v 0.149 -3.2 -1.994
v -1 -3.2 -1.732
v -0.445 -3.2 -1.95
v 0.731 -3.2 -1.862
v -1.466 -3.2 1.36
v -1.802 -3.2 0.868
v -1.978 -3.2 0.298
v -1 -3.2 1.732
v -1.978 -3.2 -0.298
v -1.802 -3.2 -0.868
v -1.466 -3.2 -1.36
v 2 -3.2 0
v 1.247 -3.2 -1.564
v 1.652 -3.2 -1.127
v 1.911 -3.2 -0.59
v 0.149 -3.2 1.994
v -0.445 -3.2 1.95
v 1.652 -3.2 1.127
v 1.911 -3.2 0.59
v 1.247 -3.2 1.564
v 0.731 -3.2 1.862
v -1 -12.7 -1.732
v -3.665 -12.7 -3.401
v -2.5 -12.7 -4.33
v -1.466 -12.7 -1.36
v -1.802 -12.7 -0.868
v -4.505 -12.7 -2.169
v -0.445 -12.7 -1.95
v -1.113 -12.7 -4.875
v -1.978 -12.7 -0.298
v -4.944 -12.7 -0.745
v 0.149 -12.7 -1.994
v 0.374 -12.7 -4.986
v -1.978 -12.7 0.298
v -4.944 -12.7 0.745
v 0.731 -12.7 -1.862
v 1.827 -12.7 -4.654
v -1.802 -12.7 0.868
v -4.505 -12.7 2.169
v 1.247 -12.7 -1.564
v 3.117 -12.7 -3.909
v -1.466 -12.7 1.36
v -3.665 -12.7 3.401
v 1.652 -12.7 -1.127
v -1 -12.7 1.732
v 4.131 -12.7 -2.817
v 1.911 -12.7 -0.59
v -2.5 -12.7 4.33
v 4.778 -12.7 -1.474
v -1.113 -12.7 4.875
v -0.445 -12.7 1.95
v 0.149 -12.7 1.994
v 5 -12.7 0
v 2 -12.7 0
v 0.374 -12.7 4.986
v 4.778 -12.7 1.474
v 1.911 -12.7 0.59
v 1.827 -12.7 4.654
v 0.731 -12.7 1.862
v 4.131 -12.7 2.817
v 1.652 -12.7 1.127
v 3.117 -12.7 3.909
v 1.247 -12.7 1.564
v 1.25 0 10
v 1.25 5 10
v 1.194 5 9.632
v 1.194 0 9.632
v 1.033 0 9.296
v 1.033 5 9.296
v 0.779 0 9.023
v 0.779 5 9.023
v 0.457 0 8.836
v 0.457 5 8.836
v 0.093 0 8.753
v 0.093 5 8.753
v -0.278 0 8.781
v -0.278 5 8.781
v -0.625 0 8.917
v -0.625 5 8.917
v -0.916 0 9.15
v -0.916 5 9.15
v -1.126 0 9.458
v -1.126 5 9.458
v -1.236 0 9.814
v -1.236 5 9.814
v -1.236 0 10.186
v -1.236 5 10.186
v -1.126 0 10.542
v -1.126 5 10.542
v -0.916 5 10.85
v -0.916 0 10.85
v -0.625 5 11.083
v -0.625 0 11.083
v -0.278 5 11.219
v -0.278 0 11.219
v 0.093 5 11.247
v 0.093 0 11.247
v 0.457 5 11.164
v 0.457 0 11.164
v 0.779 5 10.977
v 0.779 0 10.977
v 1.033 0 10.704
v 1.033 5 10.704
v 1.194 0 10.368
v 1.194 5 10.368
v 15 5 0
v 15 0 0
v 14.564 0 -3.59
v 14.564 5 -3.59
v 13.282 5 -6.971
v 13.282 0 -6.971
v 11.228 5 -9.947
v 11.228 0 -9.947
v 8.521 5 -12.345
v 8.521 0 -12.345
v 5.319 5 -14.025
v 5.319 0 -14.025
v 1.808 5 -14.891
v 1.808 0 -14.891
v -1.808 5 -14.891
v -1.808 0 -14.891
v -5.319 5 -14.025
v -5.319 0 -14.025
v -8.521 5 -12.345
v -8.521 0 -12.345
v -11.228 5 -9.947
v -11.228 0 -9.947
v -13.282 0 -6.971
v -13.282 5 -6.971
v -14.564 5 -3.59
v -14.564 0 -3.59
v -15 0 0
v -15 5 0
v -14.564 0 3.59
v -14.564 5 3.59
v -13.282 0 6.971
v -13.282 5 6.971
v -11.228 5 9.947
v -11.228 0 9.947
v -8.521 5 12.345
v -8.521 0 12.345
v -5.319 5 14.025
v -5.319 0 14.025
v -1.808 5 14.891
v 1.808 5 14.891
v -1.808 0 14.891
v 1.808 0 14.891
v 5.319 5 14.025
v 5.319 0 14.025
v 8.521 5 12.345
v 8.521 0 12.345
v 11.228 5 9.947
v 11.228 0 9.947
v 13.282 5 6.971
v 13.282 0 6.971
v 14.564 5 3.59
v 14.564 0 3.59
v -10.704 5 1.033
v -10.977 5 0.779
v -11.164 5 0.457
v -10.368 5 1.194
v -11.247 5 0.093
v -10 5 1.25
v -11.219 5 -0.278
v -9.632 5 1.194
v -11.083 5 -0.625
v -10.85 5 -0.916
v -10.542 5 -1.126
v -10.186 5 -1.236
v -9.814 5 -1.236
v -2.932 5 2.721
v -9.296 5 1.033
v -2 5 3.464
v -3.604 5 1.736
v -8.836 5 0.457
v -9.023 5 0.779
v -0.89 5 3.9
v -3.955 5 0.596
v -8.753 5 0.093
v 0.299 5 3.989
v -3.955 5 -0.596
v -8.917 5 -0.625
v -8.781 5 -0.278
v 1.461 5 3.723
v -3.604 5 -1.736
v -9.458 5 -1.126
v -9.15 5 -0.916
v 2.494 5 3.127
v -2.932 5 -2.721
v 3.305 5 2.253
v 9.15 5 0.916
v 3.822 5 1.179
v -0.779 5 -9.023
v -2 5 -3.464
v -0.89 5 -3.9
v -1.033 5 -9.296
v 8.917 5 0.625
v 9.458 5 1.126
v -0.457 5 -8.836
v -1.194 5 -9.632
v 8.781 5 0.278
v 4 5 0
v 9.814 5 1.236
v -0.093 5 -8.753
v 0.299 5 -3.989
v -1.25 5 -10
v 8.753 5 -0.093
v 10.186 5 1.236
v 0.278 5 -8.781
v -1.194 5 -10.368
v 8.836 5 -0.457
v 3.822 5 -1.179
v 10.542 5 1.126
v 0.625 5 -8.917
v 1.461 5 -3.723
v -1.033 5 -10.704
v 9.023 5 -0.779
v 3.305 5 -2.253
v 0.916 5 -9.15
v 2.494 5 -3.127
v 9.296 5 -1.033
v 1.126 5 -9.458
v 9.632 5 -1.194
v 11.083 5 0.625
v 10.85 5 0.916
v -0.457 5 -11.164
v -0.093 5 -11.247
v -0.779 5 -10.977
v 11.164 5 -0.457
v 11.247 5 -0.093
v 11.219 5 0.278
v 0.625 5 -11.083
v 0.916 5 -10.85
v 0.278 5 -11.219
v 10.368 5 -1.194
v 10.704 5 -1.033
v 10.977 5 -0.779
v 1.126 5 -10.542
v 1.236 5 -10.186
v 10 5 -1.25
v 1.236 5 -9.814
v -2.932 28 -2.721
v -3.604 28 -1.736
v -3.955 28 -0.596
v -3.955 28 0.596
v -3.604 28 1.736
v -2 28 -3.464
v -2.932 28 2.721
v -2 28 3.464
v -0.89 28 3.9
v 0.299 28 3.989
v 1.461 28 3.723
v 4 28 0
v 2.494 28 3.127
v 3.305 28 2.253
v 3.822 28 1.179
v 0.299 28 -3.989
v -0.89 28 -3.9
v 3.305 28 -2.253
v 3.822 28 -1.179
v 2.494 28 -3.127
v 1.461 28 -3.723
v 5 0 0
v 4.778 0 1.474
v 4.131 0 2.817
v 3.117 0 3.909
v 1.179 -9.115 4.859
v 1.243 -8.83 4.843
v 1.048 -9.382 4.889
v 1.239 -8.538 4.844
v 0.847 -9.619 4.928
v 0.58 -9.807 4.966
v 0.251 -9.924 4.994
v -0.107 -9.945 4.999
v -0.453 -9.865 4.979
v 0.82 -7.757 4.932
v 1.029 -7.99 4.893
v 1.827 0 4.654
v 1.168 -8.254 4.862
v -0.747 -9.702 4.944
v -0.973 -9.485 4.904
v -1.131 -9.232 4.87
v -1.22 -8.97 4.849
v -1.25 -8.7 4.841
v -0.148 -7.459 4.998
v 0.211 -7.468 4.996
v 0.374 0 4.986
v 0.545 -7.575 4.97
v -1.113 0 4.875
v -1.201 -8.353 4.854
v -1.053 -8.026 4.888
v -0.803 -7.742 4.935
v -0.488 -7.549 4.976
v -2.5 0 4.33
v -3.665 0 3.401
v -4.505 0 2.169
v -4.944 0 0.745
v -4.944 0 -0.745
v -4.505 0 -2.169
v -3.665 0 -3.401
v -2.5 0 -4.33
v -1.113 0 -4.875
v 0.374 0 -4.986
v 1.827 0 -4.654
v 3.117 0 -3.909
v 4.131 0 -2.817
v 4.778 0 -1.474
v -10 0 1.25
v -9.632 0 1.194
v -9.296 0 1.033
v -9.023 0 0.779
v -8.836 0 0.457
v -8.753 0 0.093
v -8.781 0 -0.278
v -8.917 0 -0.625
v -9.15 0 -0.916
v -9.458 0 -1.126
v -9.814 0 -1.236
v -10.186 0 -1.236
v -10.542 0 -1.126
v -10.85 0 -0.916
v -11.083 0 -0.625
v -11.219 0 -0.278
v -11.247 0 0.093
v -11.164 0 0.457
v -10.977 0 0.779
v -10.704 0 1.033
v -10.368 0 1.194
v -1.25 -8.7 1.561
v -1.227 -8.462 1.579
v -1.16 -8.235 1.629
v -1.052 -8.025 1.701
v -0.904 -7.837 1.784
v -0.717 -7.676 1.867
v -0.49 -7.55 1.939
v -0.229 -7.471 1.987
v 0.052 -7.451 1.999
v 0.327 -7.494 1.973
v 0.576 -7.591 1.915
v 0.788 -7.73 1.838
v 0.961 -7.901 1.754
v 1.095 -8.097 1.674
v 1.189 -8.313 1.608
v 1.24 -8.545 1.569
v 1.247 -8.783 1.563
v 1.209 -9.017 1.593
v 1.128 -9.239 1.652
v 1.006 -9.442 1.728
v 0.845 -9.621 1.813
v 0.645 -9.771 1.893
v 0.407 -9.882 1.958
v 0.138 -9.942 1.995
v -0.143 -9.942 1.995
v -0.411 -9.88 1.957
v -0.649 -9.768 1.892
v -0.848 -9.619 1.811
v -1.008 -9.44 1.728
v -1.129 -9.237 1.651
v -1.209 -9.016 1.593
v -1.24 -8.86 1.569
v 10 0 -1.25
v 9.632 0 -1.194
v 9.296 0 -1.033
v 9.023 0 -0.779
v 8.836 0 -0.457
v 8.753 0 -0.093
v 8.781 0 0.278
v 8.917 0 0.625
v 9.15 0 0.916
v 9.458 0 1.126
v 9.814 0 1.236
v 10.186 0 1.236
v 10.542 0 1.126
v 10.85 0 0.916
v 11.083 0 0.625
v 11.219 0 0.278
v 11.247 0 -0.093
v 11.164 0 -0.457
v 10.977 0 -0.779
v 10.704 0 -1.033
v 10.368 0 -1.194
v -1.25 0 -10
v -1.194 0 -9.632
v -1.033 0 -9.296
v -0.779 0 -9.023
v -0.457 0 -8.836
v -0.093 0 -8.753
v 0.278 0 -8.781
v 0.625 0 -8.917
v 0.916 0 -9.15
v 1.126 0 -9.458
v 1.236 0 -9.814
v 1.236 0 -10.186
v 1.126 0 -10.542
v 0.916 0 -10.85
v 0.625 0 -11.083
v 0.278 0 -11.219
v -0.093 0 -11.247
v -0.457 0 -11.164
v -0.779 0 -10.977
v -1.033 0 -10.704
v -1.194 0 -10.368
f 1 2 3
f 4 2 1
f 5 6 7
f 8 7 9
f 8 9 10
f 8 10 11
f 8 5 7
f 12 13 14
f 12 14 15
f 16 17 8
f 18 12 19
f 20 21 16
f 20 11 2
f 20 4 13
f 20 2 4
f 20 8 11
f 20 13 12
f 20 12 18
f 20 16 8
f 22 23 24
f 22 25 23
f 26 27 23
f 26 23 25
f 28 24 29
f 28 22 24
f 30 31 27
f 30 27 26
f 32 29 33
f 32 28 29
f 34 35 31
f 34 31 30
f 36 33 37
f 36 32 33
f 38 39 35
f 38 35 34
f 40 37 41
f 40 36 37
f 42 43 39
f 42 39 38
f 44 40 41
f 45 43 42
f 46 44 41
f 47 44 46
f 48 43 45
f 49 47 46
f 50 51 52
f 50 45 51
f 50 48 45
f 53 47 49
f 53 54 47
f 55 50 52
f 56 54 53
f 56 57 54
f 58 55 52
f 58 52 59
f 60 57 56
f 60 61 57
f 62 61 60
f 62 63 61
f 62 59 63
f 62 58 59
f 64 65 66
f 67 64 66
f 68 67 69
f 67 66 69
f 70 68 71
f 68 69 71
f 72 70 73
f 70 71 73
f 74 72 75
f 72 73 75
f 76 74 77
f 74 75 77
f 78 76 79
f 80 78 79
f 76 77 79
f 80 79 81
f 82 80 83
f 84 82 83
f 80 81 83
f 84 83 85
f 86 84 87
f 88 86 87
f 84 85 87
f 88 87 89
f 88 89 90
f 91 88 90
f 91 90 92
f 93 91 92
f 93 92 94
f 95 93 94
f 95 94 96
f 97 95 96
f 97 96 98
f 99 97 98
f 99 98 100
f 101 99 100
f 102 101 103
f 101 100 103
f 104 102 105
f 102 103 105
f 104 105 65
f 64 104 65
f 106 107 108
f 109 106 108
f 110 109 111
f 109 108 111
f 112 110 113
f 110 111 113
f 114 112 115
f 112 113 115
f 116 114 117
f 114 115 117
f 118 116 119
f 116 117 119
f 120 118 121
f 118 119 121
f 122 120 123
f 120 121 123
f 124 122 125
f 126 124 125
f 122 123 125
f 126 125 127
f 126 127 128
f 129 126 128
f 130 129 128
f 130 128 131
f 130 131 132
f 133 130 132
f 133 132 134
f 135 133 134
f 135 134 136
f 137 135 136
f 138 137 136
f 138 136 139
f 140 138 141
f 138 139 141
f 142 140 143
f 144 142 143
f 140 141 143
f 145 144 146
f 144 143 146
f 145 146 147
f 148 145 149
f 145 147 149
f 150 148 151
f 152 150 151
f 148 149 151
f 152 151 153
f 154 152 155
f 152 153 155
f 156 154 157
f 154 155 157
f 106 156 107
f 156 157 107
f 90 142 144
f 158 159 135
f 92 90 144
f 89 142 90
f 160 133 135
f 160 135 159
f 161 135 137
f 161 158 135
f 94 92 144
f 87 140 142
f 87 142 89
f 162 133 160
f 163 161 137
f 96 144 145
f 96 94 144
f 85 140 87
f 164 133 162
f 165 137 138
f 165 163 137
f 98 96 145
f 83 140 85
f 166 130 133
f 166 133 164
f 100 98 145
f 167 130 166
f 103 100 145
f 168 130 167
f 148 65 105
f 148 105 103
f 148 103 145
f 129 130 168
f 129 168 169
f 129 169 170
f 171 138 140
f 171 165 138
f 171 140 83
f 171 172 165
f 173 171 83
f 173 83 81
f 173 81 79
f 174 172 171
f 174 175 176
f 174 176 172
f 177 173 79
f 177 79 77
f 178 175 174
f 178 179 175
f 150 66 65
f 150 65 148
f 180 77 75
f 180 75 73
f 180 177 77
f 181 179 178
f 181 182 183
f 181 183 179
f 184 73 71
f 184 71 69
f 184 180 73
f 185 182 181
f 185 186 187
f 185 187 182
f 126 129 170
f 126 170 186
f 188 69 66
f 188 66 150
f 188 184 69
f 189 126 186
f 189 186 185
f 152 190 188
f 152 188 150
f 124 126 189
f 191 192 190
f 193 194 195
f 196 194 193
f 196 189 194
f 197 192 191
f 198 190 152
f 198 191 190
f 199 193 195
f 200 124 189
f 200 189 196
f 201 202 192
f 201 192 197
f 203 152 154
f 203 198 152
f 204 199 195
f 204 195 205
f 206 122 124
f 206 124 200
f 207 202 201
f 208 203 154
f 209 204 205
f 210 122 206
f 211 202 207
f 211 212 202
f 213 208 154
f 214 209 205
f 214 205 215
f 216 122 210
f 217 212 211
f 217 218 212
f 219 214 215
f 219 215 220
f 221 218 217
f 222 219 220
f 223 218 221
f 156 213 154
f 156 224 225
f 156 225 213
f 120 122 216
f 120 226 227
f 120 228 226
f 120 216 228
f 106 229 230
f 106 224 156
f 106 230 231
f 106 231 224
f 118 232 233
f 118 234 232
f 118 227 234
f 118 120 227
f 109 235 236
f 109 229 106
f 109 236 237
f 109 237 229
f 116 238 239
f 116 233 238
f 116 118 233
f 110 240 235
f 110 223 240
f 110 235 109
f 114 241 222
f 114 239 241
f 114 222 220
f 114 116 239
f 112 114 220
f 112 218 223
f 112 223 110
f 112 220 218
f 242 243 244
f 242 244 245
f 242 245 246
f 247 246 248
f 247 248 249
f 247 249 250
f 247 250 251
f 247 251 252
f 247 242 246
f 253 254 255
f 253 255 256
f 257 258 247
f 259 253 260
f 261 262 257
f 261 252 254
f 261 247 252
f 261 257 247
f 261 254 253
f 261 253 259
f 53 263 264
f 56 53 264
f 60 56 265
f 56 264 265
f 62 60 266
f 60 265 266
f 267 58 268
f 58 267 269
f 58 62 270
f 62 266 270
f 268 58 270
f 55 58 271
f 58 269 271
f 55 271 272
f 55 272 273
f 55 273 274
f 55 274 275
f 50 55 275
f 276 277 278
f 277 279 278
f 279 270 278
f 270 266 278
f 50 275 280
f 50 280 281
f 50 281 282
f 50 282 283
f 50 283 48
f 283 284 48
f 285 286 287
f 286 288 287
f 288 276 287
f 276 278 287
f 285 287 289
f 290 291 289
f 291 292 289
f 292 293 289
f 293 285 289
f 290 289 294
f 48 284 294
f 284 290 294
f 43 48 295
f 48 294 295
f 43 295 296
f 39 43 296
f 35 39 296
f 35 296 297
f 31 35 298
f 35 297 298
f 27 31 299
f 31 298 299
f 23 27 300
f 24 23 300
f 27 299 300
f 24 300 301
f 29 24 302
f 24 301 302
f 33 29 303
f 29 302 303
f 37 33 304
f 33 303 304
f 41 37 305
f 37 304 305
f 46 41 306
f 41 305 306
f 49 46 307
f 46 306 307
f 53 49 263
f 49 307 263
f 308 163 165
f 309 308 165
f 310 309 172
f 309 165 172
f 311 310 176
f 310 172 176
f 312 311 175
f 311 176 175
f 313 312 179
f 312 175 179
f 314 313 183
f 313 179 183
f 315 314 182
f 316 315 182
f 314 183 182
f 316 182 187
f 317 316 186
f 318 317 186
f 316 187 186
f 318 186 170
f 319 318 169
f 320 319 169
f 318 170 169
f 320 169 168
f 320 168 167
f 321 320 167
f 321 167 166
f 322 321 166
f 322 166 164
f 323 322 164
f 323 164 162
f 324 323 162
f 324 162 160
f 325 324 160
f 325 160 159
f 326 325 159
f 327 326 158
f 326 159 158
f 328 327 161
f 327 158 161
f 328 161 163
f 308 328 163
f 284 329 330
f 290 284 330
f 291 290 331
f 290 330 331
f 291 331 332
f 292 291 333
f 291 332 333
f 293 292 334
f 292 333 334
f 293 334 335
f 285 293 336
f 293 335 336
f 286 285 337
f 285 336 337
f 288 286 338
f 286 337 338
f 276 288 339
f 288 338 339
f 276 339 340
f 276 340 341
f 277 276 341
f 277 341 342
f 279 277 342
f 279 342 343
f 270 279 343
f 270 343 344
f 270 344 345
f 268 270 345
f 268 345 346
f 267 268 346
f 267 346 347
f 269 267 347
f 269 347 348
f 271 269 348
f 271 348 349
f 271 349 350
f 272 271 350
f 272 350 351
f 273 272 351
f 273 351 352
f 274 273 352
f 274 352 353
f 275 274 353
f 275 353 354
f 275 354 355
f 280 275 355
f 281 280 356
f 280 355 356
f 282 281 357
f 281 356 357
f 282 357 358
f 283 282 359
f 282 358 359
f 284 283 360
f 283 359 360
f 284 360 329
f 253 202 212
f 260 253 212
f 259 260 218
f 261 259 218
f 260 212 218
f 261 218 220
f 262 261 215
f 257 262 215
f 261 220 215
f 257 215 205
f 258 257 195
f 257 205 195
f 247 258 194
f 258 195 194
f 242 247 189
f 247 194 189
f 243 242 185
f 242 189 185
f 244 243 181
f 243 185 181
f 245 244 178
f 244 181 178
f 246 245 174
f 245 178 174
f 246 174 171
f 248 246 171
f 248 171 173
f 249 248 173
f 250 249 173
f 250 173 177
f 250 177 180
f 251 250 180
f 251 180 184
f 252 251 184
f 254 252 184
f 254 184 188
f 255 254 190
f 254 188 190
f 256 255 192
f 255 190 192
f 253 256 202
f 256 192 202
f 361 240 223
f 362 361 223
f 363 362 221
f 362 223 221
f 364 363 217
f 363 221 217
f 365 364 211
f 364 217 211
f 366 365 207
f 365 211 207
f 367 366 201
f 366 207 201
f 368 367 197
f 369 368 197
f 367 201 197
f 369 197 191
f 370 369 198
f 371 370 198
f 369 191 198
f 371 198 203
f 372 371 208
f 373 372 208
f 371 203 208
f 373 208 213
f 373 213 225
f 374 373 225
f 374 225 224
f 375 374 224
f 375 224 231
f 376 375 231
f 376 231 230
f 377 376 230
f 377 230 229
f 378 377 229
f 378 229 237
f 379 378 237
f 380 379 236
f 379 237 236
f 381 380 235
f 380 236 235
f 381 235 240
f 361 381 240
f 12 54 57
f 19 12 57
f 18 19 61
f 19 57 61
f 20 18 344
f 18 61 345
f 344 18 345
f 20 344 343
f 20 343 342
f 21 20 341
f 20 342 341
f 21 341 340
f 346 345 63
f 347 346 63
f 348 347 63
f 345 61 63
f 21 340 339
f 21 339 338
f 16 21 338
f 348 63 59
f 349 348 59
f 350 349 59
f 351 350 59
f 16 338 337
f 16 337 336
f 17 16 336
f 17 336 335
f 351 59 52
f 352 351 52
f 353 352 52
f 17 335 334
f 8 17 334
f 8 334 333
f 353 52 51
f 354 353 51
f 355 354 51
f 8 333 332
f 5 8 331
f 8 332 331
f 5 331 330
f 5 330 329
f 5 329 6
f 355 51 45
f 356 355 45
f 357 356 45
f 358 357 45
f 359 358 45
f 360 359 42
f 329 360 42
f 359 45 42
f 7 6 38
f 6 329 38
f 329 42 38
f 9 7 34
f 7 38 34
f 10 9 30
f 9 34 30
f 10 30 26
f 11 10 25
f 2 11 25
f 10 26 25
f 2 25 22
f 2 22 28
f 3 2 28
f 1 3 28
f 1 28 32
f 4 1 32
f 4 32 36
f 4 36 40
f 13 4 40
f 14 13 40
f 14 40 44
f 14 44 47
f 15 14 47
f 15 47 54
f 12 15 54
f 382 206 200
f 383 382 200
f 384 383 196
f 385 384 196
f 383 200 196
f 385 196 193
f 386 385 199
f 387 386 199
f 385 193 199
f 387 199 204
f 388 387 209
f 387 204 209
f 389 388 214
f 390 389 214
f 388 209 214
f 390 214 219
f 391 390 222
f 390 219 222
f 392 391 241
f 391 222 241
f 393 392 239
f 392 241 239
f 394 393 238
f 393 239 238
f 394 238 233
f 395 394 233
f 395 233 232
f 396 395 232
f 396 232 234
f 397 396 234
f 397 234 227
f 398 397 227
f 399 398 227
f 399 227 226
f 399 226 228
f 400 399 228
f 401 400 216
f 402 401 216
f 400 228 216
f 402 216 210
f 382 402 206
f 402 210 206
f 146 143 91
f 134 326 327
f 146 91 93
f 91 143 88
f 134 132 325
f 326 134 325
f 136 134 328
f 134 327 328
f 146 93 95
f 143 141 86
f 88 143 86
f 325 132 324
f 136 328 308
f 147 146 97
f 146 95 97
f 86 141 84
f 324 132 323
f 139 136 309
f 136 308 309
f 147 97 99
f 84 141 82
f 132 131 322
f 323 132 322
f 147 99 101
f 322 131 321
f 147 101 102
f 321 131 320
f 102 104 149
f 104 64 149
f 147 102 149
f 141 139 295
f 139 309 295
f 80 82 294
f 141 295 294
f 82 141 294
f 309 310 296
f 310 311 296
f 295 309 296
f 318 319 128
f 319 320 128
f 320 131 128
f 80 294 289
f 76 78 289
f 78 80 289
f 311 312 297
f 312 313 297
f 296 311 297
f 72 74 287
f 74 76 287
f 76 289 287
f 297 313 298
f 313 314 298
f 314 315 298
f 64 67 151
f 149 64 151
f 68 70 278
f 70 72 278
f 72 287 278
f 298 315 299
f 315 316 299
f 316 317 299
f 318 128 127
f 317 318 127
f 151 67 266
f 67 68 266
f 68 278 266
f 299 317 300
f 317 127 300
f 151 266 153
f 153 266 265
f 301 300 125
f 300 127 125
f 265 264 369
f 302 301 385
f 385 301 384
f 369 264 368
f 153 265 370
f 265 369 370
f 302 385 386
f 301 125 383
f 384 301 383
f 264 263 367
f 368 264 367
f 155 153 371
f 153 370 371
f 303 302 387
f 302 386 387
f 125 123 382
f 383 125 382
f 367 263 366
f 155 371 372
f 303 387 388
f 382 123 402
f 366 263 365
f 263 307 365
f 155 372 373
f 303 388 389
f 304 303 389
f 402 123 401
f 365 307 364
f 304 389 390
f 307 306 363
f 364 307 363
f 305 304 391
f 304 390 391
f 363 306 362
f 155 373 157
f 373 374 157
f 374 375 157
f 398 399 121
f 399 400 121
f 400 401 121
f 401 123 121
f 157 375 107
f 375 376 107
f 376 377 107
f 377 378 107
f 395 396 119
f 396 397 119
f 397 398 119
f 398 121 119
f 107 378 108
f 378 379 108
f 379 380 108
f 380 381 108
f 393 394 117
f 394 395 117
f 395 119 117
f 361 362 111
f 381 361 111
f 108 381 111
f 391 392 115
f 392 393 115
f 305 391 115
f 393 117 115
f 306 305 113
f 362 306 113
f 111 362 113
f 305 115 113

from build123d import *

# Parameters (mm, degrees)
SKETCH1_R                 = 15
BOSS_EXTRUDE1_DEPTH       = 5
SKETCH2_R                 = 5
BOSS_EXTRUDE2_DEPTH       = 12.7
SKETCH3_R                 = 2
CUT_EXTRUDE1_DEPTH        = 9.5
SKETCH5_R                 = 1.25
CUT_EXTRUDE2_DEPTH        = 5
CIRPATTERN1_COUNT         = 4
M3X0_5_TAPPED_HOLE1_D     = 2.5
M3X0_5_TAPPED_HOLE2_D     = 2.5
M3X0_5_TAPPED_HOLE2_DEPTH = 4.999
M3X0_5_TAPPED_HOLE2_TIP   = 0.751075774
SKETCH12_R                = 4
BOSS_EXTRUDE3_DEPTH       = 23


with BuildPart() as part:
    # Sketch1 → Boss-Extrude1 (new body)
    with BuildSketch(Plane(origin=(0, 0, 0), x_dir=(1, 0, 0), z_dir=(0, 1, 0))):
        Circle(SKETCH1_R)
    extrude(amount=BOSS_EXTRUDE1_DEPTH)

    # Sketch2 → Boss-Extrude2 (add)
    with BuildSketch(Plane.XZ):
        Circle(SKETCH2_R)
    extrude(amount=BOSS_EXTRUDE2_DEPTH)

    # Sketch3 → Cut-Extrude1 (cut)
    with BuildSketch(Plane.XZ.offset(12.7)):
        Circle(SKETCH3_R)
    extrude(amount=-CUT_EXTRUDE1_DEPTH, mode=Mode.SUBTRACT)

    # Sketch5 → Cut-Extrude2 (cut)
    with BuildSketch(Plane(origin=(0, 5, 0), x_dir=(1, 0, 0), z_dir=(0, 1, 0))):
        with Locations((0, -10)):
            Circle(SKETCH5_R)
    cut_extrude2 = extrude(amount=-CUT_EXTRUDE2_DEPTH, mode=Mode.SUBTRACT)

    # CirPattern1: Cut-Extrude2 ×4 about axis
    cirpattern1_axis = Axis((0, 0, 0), (0, 1, 0))
    for i in range(1, CIRPATTERN1_COUNT):
        add(cut_extrude2.rotate(cirpattern1_axis, i * 360 / CIRPATTERN1_COUNT), mode=Mode.SUBTRACT)

    # M3x0.5 Tapped Hole1 (through all)
    with Locations(Plane(origin=(0, 5, 0), x_dir=(1, 0, 0), z_dir=(0, 1, 0))):
        with Locations((-10, 0), (0, -10), (10, 0), (0, 10)):
            Hole(M3X0_5_TAPPED_HOLE1_D / 2)

    # M3x0.5 Tapped Hole2
    with Locations(Plane.XY.offset(5)):
        with Locations((0, -8.7)):
            Hole(M3X0_5_TAPPED_HOLE2_D / 2, depth=M3X0_5_TAPPED_HOLE2_DEPTH)
            with Locations((0, 0, -(M3X0_5_TAPPED_HOLE2_DEPTH + M3X0_5_TAPPED_HOLE2_TIP / 2))):  # 118° drill point
                Cone(0, M3X0_5_TAPPED_HOLE2_D / 2, M3X0_5_TAPPED_HOLE2_TIP, mode=Mode.SUBTRACT)

    # Sketch12 → Boss-Extrude3 (add)
    with BuildSketch(Plane(origin=(0, 5, 0), x_dir=(1, 0, 0), z_dir=(0, 1, 0))):
        Circle(SKETCH12_R)
    extrude(amount=BOSS_EXTRUDE3_DEPTH)


solid = part.part
